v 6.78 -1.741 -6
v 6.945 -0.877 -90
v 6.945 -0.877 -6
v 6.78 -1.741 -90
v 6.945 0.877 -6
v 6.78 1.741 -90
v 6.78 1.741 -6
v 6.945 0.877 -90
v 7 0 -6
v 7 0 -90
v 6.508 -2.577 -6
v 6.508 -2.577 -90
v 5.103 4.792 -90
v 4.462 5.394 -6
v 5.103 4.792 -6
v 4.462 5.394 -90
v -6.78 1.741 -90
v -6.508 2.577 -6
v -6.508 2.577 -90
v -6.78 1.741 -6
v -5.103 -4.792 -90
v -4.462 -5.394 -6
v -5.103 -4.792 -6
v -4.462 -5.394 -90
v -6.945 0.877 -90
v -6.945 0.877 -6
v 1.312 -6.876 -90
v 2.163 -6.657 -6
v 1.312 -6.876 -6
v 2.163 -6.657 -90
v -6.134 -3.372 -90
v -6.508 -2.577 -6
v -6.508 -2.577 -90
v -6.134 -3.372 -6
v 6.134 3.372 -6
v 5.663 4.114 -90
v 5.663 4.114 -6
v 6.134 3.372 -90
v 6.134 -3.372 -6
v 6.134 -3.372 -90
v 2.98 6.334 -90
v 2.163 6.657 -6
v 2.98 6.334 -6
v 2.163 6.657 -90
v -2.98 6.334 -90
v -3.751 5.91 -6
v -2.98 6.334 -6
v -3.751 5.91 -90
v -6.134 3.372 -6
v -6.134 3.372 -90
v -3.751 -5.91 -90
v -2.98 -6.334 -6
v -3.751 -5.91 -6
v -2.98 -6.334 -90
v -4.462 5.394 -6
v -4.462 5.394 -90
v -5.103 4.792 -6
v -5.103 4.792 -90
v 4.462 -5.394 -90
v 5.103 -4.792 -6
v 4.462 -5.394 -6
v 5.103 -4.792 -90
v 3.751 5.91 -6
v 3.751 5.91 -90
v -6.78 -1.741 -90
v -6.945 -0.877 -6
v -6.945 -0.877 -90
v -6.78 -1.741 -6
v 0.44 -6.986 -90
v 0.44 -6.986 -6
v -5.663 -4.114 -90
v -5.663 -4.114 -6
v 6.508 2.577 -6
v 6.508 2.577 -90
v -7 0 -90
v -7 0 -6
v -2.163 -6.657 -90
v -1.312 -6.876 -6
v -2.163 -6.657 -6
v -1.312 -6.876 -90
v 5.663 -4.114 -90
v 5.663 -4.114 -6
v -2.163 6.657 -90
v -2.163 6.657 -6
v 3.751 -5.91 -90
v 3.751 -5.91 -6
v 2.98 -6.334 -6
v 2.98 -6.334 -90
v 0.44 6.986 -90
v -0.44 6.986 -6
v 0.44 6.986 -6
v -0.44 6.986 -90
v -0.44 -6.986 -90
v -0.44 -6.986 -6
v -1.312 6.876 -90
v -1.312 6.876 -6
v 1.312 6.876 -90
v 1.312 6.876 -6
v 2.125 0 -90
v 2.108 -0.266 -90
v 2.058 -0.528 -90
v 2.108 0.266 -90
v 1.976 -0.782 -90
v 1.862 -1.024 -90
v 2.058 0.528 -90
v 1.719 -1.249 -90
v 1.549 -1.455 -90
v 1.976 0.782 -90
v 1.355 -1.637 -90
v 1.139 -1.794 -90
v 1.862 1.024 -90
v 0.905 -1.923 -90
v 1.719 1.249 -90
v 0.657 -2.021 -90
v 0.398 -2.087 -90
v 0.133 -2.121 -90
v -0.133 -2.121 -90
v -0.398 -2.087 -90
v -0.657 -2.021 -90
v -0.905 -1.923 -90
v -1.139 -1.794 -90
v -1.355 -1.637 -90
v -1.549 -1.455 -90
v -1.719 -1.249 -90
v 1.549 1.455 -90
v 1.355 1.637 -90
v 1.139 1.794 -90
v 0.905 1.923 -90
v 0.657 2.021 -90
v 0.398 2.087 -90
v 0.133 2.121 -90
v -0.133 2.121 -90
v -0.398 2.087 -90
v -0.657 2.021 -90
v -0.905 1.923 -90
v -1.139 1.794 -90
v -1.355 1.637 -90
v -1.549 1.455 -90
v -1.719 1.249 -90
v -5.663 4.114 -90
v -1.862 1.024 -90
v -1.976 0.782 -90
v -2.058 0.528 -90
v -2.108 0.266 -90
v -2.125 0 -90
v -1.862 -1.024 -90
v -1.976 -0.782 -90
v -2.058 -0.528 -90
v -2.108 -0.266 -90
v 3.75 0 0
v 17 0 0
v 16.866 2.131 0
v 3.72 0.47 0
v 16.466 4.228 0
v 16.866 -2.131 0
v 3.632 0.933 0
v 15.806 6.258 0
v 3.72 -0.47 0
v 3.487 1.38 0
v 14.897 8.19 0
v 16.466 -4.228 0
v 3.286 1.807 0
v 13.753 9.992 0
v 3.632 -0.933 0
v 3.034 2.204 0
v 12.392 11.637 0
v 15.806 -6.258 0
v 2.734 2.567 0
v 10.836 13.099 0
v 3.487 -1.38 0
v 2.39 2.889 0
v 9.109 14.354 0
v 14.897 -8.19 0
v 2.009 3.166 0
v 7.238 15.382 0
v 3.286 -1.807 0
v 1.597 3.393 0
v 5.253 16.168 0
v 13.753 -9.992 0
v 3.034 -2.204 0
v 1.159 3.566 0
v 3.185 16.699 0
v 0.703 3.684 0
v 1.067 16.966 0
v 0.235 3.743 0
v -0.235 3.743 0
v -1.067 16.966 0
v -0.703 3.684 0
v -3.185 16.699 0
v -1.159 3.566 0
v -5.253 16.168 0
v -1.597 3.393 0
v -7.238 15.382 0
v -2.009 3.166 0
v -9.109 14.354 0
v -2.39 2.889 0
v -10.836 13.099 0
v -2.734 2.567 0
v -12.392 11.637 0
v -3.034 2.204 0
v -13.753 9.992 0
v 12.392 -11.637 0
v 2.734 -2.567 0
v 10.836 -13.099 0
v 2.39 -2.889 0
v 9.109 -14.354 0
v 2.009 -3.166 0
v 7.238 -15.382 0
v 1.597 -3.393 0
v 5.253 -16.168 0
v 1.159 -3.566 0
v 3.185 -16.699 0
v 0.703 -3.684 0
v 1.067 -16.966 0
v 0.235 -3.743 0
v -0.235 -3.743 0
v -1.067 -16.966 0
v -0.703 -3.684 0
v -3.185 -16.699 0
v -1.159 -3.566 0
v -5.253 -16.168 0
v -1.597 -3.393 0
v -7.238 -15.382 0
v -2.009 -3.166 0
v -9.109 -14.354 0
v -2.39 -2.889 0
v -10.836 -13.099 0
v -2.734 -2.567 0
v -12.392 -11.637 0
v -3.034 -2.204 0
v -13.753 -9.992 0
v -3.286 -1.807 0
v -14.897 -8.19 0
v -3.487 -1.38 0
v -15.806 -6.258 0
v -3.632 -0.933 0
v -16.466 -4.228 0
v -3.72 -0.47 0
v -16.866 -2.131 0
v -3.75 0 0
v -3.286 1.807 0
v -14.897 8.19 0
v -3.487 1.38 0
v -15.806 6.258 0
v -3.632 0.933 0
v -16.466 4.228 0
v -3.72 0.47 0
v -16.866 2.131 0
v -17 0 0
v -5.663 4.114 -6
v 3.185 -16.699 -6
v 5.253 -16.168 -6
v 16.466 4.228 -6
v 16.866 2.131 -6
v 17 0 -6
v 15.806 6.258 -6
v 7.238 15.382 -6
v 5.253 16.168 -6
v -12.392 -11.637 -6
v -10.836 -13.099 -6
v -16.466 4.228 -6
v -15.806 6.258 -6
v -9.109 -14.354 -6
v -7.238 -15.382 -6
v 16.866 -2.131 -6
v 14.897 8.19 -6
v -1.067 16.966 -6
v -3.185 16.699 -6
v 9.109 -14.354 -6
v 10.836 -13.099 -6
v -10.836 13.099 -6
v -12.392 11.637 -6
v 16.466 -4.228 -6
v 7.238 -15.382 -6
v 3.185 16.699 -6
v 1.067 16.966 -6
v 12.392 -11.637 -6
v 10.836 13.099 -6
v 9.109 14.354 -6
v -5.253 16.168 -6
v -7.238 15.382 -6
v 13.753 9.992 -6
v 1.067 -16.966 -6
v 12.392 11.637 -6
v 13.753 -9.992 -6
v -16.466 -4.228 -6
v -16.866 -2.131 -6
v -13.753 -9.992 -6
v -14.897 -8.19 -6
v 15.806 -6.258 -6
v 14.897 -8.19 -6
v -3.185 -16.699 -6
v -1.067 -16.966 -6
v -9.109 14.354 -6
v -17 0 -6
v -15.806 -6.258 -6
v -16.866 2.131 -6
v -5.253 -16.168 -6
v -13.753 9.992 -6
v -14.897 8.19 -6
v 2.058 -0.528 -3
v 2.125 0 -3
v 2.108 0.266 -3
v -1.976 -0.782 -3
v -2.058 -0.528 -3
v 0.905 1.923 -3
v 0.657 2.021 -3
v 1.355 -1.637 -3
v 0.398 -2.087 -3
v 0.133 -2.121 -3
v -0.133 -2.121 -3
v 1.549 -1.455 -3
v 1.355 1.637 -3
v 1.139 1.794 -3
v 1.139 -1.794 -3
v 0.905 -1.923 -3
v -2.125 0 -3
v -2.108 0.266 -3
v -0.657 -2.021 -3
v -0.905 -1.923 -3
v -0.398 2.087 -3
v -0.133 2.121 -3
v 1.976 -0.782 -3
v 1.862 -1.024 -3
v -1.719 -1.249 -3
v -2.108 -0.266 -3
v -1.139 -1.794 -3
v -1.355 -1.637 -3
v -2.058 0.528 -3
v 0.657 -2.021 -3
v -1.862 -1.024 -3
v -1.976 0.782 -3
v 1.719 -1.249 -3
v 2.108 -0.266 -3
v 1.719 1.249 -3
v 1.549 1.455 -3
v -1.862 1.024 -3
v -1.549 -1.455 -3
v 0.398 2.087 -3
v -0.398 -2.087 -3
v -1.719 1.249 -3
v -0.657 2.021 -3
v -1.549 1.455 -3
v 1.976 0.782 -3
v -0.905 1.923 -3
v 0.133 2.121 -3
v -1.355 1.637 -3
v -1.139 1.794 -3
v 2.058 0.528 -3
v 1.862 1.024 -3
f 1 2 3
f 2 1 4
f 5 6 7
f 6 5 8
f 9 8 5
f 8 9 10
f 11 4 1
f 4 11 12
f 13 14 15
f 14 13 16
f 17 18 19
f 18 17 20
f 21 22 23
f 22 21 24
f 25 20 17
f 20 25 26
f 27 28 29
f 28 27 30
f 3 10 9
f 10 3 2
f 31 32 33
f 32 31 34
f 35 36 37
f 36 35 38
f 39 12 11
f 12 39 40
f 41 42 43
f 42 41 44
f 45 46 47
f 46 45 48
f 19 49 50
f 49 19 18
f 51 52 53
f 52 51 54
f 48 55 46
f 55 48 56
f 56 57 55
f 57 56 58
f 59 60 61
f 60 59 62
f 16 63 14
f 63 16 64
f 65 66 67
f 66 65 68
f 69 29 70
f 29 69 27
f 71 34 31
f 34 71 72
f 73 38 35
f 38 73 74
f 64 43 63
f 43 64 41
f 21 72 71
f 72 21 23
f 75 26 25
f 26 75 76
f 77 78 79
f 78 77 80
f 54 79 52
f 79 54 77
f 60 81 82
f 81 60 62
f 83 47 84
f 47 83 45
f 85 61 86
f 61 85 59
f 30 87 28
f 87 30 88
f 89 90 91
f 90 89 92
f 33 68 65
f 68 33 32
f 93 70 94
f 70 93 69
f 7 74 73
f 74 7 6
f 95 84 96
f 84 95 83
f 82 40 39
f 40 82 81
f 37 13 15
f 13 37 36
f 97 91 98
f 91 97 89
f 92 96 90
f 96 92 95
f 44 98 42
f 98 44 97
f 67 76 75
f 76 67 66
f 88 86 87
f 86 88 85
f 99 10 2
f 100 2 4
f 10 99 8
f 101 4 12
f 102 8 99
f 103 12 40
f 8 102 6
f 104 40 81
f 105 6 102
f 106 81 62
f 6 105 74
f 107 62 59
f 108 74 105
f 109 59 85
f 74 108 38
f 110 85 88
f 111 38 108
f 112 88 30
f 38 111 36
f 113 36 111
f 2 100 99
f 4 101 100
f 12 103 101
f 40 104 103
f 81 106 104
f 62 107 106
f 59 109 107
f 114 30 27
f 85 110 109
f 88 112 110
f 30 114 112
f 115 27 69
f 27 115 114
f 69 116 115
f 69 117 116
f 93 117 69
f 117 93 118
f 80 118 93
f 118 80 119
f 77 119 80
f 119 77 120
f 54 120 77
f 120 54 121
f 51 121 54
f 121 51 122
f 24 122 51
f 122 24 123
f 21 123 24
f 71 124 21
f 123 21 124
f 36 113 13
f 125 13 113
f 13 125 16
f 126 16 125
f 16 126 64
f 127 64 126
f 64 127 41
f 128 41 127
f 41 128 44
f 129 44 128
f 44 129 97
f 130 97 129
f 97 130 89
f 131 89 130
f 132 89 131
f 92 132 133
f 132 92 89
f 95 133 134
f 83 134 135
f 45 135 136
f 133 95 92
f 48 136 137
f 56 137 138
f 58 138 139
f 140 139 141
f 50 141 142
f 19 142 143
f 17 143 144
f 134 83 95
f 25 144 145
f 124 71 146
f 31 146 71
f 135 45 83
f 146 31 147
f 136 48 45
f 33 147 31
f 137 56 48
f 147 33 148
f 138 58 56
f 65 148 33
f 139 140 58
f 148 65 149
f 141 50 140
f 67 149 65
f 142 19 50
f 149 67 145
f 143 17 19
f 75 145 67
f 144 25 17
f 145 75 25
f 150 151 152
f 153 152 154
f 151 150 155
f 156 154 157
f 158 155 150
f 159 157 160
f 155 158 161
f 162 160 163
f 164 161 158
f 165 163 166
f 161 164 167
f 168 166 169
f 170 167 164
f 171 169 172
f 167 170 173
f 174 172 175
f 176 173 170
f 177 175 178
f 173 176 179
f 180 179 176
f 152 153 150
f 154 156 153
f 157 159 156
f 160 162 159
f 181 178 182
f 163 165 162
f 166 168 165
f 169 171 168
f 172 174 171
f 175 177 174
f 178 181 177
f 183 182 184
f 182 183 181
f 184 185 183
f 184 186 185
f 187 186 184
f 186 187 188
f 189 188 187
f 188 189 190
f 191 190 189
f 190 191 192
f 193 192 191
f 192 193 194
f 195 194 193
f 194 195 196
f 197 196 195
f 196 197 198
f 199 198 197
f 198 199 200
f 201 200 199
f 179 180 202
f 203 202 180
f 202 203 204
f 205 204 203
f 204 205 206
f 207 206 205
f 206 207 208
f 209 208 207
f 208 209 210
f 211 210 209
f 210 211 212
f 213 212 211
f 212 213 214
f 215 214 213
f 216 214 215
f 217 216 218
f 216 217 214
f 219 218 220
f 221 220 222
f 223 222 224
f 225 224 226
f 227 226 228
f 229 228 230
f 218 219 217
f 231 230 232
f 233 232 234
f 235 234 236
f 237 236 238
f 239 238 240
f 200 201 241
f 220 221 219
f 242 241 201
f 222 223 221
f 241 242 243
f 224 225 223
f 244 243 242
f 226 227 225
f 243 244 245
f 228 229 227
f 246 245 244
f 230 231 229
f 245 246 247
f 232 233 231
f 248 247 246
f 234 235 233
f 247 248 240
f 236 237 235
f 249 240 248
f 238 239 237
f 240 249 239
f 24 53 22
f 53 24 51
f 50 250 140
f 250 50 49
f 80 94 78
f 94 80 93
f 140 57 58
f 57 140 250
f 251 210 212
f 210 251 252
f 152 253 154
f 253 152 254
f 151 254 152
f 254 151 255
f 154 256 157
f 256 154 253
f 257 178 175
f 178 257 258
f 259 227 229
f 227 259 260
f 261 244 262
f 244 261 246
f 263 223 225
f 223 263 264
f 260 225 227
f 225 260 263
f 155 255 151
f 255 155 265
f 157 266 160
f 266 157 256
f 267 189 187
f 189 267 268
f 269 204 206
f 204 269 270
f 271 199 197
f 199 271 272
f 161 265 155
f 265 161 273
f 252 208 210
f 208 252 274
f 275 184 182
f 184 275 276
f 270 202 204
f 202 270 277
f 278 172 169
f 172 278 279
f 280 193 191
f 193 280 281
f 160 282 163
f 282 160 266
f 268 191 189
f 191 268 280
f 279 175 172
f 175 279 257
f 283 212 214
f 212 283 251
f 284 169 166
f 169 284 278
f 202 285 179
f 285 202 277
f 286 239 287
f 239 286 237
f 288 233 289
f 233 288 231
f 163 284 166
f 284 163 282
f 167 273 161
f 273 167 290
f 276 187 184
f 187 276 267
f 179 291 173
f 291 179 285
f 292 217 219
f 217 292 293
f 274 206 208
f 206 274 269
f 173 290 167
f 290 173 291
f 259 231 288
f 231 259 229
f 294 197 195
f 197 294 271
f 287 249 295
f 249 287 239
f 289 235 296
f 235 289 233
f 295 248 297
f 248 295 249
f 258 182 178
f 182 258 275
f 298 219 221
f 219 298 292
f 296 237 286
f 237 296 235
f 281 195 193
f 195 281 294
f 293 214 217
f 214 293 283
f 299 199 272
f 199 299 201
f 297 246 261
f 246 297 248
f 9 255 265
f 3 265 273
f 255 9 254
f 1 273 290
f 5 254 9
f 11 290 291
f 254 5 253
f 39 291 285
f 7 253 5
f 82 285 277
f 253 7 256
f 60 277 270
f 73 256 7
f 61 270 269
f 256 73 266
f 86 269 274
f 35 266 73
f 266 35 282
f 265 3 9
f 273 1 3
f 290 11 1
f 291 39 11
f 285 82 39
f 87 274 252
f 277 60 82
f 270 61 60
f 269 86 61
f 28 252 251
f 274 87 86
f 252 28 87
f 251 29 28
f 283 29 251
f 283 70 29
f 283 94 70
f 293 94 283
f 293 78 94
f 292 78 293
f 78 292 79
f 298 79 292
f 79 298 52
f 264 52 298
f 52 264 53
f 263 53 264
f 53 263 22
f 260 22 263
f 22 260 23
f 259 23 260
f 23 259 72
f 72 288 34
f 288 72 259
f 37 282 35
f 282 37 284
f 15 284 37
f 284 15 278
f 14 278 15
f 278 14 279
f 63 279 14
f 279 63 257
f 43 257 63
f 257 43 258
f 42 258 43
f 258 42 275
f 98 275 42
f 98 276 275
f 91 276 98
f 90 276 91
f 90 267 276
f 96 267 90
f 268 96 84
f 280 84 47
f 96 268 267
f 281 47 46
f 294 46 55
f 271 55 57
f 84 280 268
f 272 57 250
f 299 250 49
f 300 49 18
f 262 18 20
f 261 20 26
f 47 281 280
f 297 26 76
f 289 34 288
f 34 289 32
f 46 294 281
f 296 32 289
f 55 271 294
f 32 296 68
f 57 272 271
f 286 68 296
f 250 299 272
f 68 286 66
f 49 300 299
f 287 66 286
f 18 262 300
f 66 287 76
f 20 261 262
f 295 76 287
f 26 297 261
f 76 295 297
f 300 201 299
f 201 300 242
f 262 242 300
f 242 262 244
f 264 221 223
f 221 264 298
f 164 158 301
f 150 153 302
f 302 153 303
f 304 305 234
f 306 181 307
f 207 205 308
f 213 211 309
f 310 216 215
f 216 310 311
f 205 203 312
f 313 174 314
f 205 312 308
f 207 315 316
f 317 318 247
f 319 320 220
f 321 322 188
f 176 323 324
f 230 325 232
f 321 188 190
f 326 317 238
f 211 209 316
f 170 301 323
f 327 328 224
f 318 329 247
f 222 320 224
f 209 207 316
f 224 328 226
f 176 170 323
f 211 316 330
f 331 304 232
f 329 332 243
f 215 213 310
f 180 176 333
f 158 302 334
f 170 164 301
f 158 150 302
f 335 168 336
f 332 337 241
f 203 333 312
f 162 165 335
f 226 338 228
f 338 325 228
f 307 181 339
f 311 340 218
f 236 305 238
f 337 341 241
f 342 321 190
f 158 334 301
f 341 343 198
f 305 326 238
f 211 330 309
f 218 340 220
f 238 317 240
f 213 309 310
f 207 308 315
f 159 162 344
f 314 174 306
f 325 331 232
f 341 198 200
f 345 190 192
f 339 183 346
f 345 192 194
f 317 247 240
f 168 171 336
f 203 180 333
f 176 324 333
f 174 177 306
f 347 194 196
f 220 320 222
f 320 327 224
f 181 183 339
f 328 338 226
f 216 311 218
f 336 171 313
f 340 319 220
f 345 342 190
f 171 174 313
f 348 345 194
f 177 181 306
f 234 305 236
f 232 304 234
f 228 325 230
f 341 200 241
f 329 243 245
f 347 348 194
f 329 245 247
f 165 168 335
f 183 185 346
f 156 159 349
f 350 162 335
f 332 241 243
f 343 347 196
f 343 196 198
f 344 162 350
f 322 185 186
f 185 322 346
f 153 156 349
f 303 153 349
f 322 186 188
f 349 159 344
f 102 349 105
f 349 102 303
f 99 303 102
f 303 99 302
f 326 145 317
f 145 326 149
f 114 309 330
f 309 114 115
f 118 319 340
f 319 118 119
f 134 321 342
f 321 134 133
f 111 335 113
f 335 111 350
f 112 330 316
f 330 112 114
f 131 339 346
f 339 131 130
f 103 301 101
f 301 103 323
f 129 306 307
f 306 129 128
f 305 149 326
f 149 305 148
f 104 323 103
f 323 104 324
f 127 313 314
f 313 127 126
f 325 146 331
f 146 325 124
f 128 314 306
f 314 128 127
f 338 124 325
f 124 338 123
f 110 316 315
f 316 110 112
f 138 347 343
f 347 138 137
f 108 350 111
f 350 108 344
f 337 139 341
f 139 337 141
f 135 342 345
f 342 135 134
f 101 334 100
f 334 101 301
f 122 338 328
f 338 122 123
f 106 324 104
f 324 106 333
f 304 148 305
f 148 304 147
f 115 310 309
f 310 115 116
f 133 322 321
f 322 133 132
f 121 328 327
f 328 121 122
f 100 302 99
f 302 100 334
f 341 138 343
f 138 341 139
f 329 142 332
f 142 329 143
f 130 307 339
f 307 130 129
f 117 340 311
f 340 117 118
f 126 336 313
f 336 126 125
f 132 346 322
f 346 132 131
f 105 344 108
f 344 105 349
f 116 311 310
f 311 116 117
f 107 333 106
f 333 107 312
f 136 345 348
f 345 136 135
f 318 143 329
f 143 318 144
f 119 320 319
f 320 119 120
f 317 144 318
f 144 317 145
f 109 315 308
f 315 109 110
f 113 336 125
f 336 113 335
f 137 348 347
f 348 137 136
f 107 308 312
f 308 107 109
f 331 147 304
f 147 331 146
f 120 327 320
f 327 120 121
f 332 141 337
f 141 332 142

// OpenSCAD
$fn = 50;


difference() {
	union() {
		translate(v = [0, 0, -90.0000000000]) {
			cylinder(h = 90, r = 7.0000000000);
		}
		translate(v = [0, 0, -6.0000000000]) {
			cylinder(h = 6, r = 17.0000000000);
		}
	}
	union() {
		translate(v = [0, 0, 0]) {
			rotate(a = [0, 0, 0]) {
				difference() {
					union() {
						#translate(v = [0, 0, -90.0000000000]) {
							cylinder(h = 90, r = 2.0000000000);
						}
						#translate(v = [0, 0, -3]) {
							cylinder(h = 3, r1 = 2.1250000000, r2 = 3.7500000000);
						}
						#translate(v = [0, 0, -90.0000000000]) {
							cylinder(h = 90, r = 2.1250000000);
						}
						#translate(v = [0, 0, -90.0000000000]) {
							cylinder(h = 90, r = 2.0000000000);
						}
					}
					union();
				}
			}
		}
	}
}
